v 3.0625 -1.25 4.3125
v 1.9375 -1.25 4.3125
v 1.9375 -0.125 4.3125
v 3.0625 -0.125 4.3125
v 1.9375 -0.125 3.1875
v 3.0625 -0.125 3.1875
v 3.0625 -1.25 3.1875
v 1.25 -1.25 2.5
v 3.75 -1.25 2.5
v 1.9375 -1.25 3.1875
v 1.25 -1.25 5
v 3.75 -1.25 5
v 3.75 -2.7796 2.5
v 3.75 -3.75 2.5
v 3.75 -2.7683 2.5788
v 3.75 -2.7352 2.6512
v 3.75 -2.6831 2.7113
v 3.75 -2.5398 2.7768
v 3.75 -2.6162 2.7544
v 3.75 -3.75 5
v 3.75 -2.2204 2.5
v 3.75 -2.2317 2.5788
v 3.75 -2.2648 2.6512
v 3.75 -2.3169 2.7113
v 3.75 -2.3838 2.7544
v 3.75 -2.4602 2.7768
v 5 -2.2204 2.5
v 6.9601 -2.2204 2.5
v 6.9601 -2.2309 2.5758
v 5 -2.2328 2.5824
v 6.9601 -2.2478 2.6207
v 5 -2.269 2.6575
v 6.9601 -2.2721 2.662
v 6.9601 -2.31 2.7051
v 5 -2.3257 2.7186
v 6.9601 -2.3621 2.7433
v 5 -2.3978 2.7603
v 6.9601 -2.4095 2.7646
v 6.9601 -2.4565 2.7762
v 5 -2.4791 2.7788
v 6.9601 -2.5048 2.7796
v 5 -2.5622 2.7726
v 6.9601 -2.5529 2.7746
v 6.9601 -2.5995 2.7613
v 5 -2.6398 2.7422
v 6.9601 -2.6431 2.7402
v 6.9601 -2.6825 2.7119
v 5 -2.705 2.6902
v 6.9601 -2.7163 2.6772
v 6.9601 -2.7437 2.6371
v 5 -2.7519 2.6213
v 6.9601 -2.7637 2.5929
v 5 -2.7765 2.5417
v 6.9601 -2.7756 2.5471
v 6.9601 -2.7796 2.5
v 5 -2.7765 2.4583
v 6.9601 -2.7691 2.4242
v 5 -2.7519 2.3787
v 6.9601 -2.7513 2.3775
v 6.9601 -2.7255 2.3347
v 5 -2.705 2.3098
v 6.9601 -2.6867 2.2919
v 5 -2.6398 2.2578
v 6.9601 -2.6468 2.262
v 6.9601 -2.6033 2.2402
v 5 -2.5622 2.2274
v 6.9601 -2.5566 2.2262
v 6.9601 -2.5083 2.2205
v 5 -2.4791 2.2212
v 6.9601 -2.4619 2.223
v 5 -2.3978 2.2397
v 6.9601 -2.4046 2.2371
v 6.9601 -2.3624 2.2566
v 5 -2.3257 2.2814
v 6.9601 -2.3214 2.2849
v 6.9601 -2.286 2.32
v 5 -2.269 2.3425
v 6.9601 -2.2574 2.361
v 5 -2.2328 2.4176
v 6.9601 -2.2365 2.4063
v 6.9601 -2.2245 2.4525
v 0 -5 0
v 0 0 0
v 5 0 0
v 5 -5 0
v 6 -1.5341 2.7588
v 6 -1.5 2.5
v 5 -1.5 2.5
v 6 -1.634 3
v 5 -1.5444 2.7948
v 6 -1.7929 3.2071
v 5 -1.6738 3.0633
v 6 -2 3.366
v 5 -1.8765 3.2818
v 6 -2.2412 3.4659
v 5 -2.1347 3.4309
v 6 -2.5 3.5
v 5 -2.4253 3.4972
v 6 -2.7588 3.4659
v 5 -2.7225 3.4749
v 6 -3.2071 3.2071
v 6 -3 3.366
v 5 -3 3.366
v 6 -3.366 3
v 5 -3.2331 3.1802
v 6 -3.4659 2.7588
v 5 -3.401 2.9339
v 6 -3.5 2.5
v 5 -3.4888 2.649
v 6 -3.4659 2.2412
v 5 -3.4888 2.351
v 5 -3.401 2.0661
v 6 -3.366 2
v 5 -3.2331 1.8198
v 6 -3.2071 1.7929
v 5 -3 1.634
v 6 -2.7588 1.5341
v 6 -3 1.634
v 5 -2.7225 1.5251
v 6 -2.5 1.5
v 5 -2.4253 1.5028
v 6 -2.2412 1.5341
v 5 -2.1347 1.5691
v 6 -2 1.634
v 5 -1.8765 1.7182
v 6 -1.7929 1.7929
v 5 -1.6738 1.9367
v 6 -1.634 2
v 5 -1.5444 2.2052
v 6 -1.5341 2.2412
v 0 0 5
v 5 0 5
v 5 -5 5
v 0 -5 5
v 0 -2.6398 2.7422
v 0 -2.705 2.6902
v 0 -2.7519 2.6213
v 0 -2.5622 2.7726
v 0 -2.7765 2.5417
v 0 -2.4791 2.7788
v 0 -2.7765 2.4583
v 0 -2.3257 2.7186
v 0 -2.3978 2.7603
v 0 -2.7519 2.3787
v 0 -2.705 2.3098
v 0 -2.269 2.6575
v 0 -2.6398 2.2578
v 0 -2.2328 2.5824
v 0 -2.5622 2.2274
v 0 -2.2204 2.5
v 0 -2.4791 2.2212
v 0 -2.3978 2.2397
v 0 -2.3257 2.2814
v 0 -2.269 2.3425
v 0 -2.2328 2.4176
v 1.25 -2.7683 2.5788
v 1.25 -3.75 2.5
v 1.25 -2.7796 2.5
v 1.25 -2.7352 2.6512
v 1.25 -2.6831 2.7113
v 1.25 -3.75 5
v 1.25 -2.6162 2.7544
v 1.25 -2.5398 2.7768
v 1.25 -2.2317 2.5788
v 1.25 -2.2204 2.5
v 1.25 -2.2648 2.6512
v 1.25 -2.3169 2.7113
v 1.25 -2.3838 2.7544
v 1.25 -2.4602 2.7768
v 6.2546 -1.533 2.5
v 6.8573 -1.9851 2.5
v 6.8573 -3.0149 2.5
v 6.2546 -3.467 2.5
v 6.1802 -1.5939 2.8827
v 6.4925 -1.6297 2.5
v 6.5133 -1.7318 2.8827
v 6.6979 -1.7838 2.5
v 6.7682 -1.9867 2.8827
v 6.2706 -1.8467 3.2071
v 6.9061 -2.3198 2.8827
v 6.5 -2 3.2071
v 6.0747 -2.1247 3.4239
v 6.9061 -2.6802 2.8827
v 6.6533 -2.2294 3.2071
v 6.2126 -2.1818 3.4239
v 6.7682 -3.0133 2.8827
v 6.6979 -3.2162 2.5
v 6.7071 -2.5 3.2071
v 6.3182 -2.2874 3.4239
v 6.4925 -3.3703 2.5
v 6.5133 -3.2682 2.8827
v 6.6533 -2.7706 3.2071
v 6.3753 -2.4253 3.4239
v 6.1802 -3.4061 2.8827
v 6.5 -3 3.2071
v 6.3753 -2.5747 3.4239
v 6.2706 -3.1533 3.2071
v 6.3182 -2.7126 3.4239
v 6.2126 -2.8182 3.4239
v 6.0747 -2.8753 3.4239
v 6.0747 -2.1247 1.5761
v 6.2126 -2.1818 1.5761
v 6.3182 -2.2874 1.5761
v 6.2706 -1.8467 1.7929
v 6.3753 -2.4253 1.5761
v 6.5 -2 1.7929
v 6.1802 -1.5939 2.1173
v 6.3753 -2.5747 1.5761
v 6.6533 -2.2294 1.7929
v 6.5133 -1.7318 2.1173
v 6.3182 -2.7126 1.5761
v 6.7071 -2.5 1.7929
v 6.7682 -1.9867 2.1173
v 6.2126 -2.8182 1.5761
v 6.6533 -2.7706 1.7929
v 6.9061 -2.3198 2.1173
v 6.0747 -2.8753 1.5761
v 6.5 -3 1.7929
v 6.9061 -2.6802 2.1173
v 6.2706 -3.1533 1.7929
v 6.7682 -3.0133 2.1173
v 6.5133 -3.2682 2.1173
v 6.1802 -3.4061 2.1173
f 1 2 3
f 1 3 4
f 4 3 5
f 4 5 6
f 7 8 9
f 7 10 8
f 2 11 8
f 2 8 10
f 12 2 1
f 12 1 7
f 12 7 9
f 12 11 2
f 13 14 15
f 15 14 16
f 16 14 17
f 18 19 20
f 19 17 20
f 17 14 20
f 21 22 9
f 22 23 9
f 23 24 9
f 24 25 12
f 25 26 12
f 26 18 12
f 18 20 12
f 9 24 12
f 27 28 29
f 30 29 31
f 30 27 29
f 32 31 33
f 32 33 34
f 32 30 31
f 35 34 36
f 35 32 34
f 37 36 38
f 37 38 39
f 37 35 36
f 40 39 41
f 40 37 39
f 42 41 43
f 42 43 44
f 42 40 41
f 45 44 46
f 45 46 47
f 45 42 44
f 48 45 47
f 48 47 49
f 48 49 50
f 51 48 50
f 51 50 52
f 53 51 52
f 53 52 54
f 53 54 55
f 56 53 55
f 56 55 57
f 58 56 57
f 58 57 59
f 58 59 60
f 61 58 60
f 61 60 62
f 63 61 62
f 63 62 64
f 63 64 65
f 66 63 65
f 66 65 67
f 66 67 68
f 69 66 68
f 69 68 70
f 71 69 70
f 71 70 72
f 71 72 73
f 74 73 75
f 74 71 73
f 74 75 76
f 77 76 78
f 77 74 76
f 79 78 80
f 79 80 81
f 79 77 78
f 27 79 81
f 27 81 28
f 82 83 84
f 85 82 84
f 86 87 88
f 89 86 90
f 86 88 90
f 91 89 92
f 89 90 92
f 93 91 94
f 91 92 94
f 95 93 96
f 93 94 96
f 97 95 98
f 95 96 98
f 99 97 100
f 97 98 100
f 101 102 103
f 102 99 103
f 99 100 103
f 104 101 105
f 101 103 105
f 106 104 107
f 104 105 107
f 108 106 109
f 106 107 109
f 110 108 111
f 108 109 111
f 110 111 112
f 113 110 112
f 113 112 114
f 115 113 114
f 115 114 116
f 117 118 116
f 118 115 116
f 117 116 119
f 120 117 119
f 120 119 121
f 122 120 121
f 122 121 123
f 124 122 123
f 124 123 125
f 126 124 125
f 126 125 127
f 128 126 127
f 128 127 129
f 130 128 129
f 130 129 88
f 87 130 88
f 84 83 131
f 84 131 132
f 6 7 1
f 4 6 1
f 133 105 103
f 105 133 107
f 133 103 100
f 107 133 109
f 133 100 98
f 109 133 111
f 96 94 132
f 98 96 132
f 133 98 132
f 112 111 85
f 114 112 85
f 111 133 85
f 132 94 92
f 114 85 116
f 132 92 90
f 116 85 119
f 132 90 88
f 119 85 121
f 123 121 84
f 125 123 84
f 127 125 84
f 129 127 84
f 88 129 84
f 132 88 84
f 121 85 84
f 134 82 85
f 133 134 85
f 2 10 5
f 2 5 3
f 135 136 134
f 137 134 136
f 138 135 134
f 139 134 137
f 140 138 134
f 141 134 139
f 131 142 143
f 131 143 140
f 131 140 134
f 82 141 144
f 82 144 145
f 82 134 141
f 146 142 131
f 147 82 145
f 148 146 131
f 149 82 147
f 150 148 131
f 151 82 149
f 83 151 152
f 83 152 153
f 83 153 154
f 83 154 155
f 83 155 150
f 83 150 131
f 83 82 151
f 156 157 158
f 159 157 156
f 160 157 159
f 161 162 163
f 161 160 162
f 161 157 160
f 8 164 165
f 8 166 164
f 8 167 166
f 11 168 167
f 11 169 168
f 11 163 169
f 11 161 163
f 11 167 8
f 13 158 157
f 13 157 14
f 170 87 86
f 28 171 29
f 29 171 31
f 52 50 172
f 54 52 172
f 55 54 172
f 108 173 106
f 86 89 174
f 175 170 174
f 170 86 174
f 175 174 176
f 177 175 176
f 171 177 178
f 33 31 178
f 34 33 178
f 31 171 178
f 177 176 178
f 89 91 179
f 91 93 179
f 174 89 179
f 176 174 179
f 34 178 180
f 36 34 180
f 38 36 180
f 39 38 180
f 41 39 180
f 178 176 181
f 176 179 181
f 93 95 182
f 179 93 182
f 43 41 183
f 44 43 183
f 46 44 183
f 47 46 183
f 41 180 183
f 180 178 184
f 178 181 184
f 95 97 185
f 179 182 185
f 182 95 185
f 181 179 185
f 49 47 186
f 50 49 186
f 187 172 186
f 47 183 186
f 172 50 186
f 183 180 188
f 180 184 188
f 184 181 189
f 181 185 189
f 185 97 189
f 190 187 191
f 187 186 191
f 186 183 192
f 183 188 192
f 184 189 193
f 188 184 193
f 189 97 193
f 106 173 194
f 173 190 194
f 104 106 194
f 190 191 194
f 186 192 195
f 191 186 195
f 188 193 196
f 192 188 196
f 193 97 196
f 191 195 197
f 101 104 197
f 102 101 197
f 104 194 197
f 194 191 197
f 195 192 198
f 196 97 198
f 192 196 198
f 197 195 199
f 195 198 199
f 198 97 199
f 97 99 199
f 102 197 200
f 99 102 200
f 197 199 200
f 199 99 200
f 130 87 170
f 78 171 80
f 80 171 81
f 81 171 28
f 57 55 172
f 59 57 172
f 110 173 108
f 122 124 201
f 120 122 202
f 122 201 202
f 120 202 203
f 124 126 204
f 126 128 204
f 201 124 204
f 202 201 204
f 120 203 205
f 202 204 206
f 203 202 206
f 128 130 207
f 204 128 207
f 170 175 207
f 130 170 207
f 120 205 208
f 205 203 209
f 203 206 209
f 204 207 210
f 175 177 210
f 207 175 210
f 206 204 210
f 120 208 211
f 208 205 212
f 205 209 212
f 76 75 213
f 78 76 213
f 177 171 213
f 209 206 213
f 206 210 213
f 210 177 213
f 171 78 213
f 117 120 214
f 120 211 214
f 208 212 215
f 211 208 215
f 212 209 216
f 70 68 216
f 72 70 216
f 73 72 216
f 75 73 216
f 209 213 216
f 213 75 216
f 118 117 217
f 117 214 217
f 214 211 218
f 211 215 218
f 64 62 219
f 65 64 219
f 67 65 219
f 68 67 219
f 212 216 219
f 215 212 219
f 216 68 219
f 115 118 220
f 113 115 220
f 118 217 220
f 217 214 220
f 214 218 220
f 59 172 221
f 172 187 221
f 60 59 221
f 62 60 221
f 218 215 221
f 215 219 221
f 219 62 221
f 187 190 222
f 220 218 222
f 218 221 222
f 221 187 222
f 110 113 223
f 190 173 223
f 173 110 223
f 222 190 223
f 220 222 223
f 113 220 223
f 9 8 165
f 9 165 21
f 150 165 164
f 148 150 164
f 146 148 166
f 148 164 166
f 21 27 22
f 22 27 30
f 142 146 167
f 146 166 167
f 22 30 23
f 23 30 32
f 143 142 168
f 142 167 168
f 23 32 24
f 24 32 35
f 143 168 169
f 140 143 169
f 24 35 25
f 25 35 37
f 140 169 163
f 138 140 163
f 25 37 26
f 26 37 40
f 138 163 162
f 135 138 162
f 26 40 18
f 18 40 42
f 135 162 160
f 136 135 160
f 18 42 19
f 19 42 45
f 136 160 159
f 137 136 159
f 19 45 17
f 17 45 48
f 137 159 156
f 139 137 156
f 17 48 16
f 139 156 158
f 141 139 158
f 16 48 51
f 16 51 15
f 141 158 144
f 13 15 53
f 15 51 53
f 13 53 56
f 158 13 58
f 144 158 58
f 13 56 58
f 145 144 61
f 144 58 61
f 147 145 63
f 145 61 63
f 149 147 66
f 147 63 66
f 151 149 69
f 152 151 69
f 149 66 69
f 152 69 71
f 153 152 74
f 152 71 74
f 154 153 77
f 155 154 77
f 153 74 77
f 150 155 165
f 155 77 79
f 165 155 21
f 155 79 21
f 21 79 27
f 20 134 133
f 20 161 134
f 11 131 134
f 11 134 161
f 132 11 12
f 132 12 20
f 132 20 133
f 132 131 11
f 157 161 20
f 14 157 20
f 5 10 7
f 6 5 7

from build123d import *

# Parameters (mm, degrees)
F0_W           = 5
F0_H           = 5
F2_DEPTH       = 5
F3_W           = 2.5
F3_H           = 2.5
F4_DEPTH       = 2.5
F5_W           = 1.125
F5_H           = 1.125
F6_DEPTH       = 1.125
F7_R           = 1
F8_DEPTH       = 1
F10_ANGLE      = 180
F11_R          = 0.2796205341
F12_DEPTH      = 25.4
F13_DEPTH      = 2
F13_DEPTH_BACK = 5


# Not quite as in the source:
# - the program builds the solid bodies; features that only make, move or delete a surface that nothing else refers to are left out


with BuildPart() as f2:
    # F0 (on Top) → F2 (new body)
    with BuildSketch(Plane.XY):
        with Locations((2.5, -2.5)):
            Rectangle(F0_W, F0_H)
    extrude(amount=F2_DEPTH)

    # F3 (on face) → F4 (cut)
    with BuildSketch(Plane.XY.offset(5)):
        with Locations((2.5, -2.5)):
            Rectangle(F3_W, F3_H)
    extrude(amount=-F4_DEPTH, mode=Mode.SUBTRACT)

    # F5 (on face) → F6 (cut)
    with BuildSketch(Plane.XZ.offset(1.25)):
        with Locations((2.5, 3.75)):
            Rectangle(F5_W, F5_H)
    extrude(amount=-F6_DEPTH, mode=Mode.SUBTRACT)

    # F7 (on face) → F8 (join)
    with BuildSketch(Plane.YZ.offset(5)):
        with Locations((-2.5, 2.5)):
            Circle(F7_R)
    extrude(amount=F8_DEPTH)

    # F9 (on face) → F10 (revolve)
    with BuildSketch(Plane.YZ.offset(6)):
        with BuildLine():
            ThreePointArc((-1.5, 2.5), (-1.7928932188, 3.2071067812), (-2.5, 3.5))
            Line((-2.5, 3.5), (-2.5, 1.5))
            ThreePointArc((-2.5, 1.5), (-1.7928932188, 1.7928932188), (-1.5, 2.5))
        make_face()
    revolve(axis=Axis((6, -2.5, 2.5), (0, 0, -1)), revolution_arc=F10_ANGLE)

    # F11 (on face) → F12 (cut)
    with BuildSketch(Plane.YZ.offset(5)):
        with Locations((-2.5, 2.5)):
            Circle(F11_R)
    extrude(amount=F12_DEPTH, mode=Mode.SUBTRACT)

    # F11 (on face) → F13 (cut, two sides)
    with BuildSketch(Plane.YZ.offset(5)) as f13_sk:
        with Locations((-2.5, 2.5)):
            Circle(F11_R)
    extrude(amount=F13_DEPTH, mode=Mode.SUBTRACT)
    extrude(f13_sk.sketch, amount=-F13_DEPTH_BACK, mode=Mode.SUBTRACT)


solid = f2.part
